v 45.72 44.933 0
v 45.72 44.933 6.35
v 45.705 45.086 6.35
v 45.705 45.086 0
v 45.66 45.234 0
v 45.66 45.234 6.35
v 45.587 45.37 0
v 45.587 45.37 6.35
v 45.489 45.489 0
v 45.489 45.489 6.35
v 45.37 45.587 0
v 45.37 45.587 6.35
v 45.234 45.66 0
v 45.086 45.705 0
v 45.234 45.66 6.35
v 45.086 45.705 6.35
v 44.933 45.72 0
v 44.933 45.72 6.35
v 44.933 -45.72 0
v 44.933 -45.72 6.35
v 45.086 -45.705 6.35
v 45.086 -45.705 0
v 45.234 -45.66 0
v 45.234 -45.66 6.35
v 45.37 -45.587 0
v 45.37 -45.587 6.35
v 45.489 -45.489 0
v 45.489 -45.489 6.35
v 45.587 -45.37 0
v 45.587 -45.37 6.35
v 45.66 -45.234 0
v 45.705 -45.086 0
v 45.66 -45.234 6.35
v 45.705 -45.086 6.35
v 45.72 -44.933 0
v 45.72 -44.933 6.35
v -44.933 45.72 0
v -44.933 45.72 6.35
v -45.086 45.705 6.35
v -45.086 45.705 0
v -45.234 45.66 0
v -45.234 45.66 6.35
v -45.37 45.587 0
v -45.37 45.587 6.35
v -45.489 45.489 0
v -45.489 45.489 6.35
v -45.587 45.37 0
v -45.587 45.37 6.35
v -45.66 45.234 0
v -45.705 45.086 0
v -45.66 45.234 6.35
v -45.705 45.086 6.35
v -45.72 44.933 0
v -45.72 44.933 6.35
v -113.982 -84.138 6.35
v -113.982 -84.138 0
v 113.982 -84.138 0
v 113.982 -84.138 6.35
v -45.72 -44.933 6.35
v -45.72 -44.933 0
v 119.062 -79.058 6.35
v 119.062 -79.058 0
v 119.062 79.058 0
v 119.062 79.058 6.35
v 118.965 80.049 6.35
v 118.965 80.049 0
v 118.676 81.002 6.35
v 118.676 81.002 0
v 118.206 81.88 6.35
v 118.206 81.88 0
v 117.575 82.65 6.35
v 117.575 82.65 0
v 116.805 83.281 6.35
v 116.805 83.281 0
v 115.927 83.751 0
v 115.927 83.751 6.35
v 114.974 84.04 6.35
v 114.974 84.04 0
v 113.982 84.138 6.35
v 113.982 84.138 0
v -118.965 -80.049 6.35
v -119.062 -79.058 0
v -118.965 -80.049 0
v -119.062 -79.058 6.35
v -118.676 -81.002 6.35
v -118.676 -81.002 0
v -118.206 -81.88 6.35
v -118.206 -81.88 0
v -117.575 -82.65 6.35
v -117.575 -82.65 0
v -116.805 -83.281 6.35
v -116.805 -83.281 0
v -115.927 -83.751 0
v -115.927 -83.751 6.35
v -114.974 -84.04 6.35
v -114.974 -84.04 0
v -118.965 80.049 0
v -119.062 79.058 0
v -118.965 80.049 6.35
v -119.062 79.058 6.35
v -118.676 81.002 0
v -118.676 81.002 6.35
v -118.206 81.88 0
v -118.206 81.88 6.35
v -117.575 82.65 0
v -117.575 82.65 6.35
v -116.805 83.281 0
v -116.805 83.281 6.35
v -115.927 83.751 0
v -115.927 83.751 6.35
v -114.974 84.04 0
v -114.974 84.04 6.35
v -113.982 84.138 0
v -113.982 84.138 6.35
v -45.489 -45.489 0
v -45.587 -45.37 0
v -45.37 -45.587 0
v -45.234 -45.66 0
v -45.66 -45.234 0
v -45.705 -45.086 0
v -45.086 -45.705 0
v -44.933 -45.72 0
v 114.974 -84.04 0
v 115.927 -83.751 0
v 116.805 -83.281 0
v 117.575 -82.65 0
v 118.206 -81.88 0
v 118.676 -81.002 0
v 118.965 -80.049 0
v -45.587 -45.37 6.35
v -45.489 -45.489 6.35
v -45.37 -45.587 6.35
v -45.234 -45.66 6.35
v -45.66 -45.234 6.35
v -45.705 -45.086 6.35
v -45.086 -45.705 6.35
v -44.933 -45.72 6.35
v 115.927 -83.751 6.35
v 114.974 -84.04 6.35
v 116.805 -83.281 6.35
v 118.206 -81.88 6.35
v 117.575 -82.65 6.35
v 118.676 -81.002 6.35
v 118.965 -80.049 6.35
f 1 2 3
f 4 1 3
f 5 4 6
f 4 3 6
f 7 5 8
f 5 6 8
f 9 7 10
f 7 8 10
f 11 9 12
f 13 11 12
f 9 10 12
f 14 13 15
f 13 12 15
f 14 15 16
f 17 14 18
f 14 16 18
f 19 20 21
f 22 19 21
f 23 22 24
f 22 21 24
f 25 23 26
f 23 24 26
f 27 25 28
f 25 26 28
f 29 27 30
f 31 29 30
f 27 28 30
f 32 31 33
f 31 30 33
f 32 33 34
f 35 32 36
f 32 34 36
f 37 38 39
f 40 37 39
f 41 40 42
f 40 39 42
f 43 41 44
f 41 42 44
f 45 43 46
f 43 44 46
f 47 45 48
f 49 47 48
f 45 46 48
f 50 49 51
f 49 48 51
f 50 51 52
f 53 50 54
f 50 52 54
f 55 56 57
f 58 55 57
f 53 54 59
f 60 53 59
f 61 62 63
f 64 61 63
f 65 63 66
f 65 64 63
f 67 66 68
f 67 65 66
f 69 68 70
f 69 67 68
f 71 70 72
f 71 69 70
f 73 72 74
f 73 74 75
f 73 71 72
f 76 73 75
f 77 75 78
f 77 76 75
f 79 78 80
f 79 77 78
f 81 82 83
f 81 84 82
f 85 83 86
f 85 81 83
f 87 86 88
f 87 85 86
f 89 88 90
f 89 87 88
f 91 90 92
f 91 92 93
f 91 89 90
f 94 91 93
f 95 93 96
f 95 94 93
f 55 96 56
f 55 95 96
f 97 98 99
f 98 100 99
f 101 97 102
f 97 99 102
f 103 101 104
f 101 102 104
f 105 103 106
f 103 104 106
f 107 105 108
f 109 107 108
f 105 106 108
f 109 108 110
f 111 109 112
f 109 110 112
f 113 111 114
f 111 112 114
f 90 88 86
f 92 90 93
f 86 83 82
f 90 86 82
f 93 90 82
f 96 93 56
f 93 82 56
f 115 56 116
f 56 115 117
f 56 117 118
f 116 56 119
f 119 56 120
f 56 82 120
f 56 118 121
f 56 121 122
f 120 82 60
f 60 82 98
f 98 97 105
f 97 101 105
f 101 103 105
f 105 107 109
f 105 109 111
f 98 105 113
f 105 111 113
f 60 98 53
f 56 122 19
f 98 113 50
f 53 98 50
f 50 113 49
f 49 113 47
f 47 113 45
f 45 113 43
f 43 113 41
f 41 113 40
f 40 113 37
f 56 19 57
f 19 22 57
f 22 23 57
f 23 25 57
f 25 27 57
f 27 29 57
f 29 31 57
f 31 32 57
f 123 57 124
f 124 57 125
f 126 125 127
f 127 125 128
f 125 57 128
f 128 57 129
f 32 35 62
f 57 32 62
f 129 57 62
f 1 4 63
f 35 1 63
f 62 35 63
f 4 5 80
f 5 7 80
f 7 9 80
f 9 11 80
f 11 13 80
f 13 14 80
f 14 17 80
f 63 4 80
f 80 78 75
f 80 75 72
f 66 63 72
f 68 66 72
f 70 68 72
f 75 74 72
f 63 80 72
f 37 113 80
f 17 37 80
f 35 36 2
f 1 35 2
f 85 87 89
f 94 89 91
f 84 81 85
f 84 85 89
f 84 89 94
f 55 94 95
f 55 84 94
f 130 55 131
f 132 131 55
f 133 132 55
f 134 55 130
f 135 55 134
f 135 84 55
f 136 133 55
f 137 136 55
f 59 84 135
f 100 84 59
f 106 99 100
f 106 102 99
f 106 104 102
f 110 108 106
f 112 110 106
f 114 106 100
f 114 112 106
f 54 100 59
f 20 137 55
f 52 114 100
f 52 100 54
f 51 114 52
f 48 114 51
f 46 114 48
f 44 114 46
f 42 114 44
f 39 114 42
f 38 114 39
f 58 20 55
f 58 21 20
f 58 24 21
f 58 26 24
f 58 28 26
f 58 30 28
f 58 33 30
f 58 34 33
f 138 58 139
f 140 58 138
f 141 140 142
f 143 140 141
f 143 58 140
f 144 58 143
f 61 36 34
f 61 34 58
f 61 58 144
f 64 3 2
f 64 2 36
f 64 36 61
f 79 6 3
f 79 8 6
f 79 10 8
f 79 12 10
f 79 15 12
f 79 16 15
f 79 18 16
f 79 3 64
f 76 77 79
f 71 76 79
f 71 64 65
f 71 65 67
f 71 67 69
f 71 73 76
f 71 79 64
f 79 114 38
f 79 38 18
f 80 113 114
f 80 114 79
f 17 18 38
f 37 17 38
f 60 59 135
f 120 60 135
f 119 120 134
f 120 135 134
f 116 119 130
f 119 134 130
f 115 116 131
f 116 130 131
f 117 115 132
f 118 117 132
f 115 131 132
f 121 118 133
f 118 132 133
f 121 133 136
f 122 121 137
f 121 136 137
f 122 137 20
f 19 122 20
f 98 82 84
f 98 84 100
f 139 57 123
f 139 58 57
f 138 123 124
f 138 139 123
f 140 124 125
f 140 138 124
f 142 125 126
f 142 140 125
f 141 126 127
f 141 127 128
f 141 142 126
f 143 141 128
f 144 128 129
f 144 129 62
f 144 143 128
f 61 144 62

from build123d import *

# Parameters (mm, degrees)
F0_W     = 238.125
F0_H     = 168.275
F1_DEPTH = 6.35
F2_R     = 5.08
F3_W     = 88.9
F3_H     = 88.9
F4_DEPTH = 25.4
F6_DEPTH = 25.4


with BuildPart() as f1:
    # F0 (on Top) → F1 (new body)
    with BuildSketch(Plane.XY):
        Rectangle(F0_W, F0_H)
    extrude(amount=F1_DEPTH)

    # F2
    f2_edges = [f1.edges().sort_by_distance(p)[0] for p in [
        (119.0625, 84.1375, 3.175),
        (-119.0625, 84.1375, 3.175),
        (119.0625, -84.1375, 3.175),
        (-119.0625, -84.1375, 3.175),
    ]]
    fillet(f2_edges, radius=F2_R)

    # F3 (on face) → F4 (cut)
    with BuildSketch(Plane.XY.offset(6.35)):
        Rectangle(F3_W, F3_H)
    extrude(amount=-F4_DEPTH, mode=Mode.SUBTRACT)

    # F5 (on face) → F6 (cut)
    with BuildSketch(Plane.XY.offset(6.35)):
        with BuildLine():
            ThreePointArc((45.72, 44.9326), (45.489376, 45.489376), (44.9326, 45.72))
            Line((44.9326, 45.72), (-44.9326, 45.72))
            ThreePointArc((-44.9326, 45.72), (-45.489376, 45.489376), (-45.72, 44.9326))
            Line((-45.72, 44.9326), (-45.72, -44.9326))
            ThreePointArc((-45.72, -44.9326), (-45.489376, -45.489376), (-44.9326, -45.72))
            Line((-44.9326, -45.72), (44.9326, -45.72))
            ThreePointArc((44.9326, -45.72), (45.489376, -45.489376), (45.72, -44.9326))
            Line((45.72, -44.9326), (45.72, 44.9326))
        make_face()
    extrude(amount=-F6_DEPTH, mode=Mode.SUBTRACT)


solid = f1.part
